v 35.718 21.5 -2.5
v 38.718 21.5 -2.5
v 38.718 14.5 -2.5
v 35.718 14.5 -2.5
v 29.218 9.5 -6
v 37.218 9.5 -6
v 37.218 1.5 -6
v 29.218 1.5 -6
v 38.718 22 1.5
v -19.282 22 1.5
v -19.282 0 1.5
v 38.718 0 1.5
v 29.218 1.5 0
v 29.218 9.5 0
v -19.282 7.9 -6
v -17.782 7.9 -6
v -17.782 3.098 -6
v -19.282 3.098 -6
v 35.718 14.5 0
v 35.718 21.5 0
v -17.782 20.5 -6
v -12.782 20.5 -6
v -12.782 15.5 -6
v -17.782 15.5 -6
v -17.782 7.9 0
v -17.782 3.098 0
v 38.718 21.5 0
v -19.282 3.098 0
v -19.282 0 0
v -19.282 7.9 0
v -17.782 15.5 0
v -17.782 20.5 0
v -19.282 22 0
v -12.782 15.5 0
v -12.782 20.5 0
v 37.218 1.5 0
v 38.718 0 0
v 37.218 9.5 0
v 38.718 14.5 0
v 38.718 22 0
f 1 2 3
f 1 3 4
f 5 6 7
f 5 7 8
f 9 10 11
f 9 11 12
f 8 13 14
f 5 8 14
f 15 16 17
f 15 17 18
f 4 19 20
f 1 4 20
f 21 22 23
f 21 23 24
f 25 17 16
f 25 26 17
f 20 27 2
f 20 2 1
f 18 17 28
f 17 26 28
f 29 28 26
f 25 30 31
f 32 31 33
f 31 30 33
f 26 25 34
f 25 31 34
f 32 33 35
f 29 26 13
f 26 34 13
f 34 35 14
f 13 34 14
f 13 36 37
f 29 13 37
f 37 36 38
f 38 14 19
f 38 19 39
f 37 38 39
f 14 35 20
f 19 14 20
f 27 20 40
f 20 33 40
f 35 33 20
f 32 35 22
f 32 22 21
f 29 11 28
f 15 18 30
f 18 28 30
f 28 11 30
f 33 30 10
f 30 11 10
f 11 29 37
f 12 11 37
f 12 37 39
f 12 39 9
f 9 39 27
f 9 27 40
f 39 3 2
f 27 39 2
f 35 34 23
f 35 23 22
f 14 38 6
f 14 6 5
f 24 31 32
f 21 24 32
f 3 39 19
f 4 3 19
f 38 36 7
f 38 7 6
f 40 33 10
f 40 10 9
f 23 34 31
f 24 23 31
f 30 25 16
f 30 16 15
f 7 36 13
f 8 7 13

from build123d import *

# Parameters (mm, degrees)
SKETCH1_W           = 58
SKETCH1_H           = 22
BOSS_EXTRUDE1_DEPTH = 1.5
SKETCH2_W           = 5
SKETCH2_H           = 5
SKETCH2_W_2         = 1.5
SKETCH2_H_2         = 4.802137959
SKETCH2_W_3         = 3
SKETCH2_H_3         = 7
SKETCH2_W_4         = 8
SKETCH2_H_4         = 8
BOSS_EXTRUDE2_DEPTH = 2.5
SKETCH3_W           = 1.5
SKETCH3_H           = 4.802137959
SKETCH3_W_2         = 5
SKETCH3_H_2         = 5
SKETCH3_W_3         = 8
SKETCH3_H_3         = 8
BOSS_EXTRUDE3_DEPTH = 3.5


with BuildPart() as part:
    # Sketch1 → Boss-Extrude1 (new body)
    with BuildSketch(Plane.XY):
        with Locations((9.718487395, 11)):
            Rectangle(SKETCH1_W, SKETCH1_H)
    extrude(amount=BOSS_EXTRUDE1_DEPTH)

    # Sketch2 → Boss-Extrude2 (add)
    with BuildSketch(Plane(origin=(0, 0, 0), x_dir=(-1, 0, 0), z_dir=(0, 0, -1))):
        with Locations((15.281512605, 18)):
            Rectangle(SKETCH2_W, SKETCH2_H)
        with Locations((18.531512605, 5.498931021)):
            Rectangle(SKETCH2_W_2, SKETCH2_H_2)
        with Locations((-37.218487395, 18)):
            Rectangle(SKETCH2_W_3, SKETCH2_H_3)
        with Locations((-33.218487395, 5.5)):
            Rectangle(SKETCH2_W_4, SKETCH2_H_4)
    extrude(amount=BOSS_EXTRUDE2_DEPTH)

    # Sketch3 → Boss-Extrude3 (add)
    with BuildSketch(Plane(origin=(0, 0, -2.5), x_dir=(-1, 0, 0), z_dir=(0, 0, -1))):
        with Locations((18.531512605, 5.498931021)):
            Rectangle(SKETCH3_W, SKETCH3_H)
        with Locations((15.281512605, 18)):
            Rectangle(SKETCH3_W_2, SKETCH3_H_2)
        with Locations((-33.218487395, 5.5)):
            Rectangle(SKETCH3_W_3, SKETCH3_H_3)
    extrude(amount=BOSS_EXTRUDE3_DEPTH)


solid = part.part
